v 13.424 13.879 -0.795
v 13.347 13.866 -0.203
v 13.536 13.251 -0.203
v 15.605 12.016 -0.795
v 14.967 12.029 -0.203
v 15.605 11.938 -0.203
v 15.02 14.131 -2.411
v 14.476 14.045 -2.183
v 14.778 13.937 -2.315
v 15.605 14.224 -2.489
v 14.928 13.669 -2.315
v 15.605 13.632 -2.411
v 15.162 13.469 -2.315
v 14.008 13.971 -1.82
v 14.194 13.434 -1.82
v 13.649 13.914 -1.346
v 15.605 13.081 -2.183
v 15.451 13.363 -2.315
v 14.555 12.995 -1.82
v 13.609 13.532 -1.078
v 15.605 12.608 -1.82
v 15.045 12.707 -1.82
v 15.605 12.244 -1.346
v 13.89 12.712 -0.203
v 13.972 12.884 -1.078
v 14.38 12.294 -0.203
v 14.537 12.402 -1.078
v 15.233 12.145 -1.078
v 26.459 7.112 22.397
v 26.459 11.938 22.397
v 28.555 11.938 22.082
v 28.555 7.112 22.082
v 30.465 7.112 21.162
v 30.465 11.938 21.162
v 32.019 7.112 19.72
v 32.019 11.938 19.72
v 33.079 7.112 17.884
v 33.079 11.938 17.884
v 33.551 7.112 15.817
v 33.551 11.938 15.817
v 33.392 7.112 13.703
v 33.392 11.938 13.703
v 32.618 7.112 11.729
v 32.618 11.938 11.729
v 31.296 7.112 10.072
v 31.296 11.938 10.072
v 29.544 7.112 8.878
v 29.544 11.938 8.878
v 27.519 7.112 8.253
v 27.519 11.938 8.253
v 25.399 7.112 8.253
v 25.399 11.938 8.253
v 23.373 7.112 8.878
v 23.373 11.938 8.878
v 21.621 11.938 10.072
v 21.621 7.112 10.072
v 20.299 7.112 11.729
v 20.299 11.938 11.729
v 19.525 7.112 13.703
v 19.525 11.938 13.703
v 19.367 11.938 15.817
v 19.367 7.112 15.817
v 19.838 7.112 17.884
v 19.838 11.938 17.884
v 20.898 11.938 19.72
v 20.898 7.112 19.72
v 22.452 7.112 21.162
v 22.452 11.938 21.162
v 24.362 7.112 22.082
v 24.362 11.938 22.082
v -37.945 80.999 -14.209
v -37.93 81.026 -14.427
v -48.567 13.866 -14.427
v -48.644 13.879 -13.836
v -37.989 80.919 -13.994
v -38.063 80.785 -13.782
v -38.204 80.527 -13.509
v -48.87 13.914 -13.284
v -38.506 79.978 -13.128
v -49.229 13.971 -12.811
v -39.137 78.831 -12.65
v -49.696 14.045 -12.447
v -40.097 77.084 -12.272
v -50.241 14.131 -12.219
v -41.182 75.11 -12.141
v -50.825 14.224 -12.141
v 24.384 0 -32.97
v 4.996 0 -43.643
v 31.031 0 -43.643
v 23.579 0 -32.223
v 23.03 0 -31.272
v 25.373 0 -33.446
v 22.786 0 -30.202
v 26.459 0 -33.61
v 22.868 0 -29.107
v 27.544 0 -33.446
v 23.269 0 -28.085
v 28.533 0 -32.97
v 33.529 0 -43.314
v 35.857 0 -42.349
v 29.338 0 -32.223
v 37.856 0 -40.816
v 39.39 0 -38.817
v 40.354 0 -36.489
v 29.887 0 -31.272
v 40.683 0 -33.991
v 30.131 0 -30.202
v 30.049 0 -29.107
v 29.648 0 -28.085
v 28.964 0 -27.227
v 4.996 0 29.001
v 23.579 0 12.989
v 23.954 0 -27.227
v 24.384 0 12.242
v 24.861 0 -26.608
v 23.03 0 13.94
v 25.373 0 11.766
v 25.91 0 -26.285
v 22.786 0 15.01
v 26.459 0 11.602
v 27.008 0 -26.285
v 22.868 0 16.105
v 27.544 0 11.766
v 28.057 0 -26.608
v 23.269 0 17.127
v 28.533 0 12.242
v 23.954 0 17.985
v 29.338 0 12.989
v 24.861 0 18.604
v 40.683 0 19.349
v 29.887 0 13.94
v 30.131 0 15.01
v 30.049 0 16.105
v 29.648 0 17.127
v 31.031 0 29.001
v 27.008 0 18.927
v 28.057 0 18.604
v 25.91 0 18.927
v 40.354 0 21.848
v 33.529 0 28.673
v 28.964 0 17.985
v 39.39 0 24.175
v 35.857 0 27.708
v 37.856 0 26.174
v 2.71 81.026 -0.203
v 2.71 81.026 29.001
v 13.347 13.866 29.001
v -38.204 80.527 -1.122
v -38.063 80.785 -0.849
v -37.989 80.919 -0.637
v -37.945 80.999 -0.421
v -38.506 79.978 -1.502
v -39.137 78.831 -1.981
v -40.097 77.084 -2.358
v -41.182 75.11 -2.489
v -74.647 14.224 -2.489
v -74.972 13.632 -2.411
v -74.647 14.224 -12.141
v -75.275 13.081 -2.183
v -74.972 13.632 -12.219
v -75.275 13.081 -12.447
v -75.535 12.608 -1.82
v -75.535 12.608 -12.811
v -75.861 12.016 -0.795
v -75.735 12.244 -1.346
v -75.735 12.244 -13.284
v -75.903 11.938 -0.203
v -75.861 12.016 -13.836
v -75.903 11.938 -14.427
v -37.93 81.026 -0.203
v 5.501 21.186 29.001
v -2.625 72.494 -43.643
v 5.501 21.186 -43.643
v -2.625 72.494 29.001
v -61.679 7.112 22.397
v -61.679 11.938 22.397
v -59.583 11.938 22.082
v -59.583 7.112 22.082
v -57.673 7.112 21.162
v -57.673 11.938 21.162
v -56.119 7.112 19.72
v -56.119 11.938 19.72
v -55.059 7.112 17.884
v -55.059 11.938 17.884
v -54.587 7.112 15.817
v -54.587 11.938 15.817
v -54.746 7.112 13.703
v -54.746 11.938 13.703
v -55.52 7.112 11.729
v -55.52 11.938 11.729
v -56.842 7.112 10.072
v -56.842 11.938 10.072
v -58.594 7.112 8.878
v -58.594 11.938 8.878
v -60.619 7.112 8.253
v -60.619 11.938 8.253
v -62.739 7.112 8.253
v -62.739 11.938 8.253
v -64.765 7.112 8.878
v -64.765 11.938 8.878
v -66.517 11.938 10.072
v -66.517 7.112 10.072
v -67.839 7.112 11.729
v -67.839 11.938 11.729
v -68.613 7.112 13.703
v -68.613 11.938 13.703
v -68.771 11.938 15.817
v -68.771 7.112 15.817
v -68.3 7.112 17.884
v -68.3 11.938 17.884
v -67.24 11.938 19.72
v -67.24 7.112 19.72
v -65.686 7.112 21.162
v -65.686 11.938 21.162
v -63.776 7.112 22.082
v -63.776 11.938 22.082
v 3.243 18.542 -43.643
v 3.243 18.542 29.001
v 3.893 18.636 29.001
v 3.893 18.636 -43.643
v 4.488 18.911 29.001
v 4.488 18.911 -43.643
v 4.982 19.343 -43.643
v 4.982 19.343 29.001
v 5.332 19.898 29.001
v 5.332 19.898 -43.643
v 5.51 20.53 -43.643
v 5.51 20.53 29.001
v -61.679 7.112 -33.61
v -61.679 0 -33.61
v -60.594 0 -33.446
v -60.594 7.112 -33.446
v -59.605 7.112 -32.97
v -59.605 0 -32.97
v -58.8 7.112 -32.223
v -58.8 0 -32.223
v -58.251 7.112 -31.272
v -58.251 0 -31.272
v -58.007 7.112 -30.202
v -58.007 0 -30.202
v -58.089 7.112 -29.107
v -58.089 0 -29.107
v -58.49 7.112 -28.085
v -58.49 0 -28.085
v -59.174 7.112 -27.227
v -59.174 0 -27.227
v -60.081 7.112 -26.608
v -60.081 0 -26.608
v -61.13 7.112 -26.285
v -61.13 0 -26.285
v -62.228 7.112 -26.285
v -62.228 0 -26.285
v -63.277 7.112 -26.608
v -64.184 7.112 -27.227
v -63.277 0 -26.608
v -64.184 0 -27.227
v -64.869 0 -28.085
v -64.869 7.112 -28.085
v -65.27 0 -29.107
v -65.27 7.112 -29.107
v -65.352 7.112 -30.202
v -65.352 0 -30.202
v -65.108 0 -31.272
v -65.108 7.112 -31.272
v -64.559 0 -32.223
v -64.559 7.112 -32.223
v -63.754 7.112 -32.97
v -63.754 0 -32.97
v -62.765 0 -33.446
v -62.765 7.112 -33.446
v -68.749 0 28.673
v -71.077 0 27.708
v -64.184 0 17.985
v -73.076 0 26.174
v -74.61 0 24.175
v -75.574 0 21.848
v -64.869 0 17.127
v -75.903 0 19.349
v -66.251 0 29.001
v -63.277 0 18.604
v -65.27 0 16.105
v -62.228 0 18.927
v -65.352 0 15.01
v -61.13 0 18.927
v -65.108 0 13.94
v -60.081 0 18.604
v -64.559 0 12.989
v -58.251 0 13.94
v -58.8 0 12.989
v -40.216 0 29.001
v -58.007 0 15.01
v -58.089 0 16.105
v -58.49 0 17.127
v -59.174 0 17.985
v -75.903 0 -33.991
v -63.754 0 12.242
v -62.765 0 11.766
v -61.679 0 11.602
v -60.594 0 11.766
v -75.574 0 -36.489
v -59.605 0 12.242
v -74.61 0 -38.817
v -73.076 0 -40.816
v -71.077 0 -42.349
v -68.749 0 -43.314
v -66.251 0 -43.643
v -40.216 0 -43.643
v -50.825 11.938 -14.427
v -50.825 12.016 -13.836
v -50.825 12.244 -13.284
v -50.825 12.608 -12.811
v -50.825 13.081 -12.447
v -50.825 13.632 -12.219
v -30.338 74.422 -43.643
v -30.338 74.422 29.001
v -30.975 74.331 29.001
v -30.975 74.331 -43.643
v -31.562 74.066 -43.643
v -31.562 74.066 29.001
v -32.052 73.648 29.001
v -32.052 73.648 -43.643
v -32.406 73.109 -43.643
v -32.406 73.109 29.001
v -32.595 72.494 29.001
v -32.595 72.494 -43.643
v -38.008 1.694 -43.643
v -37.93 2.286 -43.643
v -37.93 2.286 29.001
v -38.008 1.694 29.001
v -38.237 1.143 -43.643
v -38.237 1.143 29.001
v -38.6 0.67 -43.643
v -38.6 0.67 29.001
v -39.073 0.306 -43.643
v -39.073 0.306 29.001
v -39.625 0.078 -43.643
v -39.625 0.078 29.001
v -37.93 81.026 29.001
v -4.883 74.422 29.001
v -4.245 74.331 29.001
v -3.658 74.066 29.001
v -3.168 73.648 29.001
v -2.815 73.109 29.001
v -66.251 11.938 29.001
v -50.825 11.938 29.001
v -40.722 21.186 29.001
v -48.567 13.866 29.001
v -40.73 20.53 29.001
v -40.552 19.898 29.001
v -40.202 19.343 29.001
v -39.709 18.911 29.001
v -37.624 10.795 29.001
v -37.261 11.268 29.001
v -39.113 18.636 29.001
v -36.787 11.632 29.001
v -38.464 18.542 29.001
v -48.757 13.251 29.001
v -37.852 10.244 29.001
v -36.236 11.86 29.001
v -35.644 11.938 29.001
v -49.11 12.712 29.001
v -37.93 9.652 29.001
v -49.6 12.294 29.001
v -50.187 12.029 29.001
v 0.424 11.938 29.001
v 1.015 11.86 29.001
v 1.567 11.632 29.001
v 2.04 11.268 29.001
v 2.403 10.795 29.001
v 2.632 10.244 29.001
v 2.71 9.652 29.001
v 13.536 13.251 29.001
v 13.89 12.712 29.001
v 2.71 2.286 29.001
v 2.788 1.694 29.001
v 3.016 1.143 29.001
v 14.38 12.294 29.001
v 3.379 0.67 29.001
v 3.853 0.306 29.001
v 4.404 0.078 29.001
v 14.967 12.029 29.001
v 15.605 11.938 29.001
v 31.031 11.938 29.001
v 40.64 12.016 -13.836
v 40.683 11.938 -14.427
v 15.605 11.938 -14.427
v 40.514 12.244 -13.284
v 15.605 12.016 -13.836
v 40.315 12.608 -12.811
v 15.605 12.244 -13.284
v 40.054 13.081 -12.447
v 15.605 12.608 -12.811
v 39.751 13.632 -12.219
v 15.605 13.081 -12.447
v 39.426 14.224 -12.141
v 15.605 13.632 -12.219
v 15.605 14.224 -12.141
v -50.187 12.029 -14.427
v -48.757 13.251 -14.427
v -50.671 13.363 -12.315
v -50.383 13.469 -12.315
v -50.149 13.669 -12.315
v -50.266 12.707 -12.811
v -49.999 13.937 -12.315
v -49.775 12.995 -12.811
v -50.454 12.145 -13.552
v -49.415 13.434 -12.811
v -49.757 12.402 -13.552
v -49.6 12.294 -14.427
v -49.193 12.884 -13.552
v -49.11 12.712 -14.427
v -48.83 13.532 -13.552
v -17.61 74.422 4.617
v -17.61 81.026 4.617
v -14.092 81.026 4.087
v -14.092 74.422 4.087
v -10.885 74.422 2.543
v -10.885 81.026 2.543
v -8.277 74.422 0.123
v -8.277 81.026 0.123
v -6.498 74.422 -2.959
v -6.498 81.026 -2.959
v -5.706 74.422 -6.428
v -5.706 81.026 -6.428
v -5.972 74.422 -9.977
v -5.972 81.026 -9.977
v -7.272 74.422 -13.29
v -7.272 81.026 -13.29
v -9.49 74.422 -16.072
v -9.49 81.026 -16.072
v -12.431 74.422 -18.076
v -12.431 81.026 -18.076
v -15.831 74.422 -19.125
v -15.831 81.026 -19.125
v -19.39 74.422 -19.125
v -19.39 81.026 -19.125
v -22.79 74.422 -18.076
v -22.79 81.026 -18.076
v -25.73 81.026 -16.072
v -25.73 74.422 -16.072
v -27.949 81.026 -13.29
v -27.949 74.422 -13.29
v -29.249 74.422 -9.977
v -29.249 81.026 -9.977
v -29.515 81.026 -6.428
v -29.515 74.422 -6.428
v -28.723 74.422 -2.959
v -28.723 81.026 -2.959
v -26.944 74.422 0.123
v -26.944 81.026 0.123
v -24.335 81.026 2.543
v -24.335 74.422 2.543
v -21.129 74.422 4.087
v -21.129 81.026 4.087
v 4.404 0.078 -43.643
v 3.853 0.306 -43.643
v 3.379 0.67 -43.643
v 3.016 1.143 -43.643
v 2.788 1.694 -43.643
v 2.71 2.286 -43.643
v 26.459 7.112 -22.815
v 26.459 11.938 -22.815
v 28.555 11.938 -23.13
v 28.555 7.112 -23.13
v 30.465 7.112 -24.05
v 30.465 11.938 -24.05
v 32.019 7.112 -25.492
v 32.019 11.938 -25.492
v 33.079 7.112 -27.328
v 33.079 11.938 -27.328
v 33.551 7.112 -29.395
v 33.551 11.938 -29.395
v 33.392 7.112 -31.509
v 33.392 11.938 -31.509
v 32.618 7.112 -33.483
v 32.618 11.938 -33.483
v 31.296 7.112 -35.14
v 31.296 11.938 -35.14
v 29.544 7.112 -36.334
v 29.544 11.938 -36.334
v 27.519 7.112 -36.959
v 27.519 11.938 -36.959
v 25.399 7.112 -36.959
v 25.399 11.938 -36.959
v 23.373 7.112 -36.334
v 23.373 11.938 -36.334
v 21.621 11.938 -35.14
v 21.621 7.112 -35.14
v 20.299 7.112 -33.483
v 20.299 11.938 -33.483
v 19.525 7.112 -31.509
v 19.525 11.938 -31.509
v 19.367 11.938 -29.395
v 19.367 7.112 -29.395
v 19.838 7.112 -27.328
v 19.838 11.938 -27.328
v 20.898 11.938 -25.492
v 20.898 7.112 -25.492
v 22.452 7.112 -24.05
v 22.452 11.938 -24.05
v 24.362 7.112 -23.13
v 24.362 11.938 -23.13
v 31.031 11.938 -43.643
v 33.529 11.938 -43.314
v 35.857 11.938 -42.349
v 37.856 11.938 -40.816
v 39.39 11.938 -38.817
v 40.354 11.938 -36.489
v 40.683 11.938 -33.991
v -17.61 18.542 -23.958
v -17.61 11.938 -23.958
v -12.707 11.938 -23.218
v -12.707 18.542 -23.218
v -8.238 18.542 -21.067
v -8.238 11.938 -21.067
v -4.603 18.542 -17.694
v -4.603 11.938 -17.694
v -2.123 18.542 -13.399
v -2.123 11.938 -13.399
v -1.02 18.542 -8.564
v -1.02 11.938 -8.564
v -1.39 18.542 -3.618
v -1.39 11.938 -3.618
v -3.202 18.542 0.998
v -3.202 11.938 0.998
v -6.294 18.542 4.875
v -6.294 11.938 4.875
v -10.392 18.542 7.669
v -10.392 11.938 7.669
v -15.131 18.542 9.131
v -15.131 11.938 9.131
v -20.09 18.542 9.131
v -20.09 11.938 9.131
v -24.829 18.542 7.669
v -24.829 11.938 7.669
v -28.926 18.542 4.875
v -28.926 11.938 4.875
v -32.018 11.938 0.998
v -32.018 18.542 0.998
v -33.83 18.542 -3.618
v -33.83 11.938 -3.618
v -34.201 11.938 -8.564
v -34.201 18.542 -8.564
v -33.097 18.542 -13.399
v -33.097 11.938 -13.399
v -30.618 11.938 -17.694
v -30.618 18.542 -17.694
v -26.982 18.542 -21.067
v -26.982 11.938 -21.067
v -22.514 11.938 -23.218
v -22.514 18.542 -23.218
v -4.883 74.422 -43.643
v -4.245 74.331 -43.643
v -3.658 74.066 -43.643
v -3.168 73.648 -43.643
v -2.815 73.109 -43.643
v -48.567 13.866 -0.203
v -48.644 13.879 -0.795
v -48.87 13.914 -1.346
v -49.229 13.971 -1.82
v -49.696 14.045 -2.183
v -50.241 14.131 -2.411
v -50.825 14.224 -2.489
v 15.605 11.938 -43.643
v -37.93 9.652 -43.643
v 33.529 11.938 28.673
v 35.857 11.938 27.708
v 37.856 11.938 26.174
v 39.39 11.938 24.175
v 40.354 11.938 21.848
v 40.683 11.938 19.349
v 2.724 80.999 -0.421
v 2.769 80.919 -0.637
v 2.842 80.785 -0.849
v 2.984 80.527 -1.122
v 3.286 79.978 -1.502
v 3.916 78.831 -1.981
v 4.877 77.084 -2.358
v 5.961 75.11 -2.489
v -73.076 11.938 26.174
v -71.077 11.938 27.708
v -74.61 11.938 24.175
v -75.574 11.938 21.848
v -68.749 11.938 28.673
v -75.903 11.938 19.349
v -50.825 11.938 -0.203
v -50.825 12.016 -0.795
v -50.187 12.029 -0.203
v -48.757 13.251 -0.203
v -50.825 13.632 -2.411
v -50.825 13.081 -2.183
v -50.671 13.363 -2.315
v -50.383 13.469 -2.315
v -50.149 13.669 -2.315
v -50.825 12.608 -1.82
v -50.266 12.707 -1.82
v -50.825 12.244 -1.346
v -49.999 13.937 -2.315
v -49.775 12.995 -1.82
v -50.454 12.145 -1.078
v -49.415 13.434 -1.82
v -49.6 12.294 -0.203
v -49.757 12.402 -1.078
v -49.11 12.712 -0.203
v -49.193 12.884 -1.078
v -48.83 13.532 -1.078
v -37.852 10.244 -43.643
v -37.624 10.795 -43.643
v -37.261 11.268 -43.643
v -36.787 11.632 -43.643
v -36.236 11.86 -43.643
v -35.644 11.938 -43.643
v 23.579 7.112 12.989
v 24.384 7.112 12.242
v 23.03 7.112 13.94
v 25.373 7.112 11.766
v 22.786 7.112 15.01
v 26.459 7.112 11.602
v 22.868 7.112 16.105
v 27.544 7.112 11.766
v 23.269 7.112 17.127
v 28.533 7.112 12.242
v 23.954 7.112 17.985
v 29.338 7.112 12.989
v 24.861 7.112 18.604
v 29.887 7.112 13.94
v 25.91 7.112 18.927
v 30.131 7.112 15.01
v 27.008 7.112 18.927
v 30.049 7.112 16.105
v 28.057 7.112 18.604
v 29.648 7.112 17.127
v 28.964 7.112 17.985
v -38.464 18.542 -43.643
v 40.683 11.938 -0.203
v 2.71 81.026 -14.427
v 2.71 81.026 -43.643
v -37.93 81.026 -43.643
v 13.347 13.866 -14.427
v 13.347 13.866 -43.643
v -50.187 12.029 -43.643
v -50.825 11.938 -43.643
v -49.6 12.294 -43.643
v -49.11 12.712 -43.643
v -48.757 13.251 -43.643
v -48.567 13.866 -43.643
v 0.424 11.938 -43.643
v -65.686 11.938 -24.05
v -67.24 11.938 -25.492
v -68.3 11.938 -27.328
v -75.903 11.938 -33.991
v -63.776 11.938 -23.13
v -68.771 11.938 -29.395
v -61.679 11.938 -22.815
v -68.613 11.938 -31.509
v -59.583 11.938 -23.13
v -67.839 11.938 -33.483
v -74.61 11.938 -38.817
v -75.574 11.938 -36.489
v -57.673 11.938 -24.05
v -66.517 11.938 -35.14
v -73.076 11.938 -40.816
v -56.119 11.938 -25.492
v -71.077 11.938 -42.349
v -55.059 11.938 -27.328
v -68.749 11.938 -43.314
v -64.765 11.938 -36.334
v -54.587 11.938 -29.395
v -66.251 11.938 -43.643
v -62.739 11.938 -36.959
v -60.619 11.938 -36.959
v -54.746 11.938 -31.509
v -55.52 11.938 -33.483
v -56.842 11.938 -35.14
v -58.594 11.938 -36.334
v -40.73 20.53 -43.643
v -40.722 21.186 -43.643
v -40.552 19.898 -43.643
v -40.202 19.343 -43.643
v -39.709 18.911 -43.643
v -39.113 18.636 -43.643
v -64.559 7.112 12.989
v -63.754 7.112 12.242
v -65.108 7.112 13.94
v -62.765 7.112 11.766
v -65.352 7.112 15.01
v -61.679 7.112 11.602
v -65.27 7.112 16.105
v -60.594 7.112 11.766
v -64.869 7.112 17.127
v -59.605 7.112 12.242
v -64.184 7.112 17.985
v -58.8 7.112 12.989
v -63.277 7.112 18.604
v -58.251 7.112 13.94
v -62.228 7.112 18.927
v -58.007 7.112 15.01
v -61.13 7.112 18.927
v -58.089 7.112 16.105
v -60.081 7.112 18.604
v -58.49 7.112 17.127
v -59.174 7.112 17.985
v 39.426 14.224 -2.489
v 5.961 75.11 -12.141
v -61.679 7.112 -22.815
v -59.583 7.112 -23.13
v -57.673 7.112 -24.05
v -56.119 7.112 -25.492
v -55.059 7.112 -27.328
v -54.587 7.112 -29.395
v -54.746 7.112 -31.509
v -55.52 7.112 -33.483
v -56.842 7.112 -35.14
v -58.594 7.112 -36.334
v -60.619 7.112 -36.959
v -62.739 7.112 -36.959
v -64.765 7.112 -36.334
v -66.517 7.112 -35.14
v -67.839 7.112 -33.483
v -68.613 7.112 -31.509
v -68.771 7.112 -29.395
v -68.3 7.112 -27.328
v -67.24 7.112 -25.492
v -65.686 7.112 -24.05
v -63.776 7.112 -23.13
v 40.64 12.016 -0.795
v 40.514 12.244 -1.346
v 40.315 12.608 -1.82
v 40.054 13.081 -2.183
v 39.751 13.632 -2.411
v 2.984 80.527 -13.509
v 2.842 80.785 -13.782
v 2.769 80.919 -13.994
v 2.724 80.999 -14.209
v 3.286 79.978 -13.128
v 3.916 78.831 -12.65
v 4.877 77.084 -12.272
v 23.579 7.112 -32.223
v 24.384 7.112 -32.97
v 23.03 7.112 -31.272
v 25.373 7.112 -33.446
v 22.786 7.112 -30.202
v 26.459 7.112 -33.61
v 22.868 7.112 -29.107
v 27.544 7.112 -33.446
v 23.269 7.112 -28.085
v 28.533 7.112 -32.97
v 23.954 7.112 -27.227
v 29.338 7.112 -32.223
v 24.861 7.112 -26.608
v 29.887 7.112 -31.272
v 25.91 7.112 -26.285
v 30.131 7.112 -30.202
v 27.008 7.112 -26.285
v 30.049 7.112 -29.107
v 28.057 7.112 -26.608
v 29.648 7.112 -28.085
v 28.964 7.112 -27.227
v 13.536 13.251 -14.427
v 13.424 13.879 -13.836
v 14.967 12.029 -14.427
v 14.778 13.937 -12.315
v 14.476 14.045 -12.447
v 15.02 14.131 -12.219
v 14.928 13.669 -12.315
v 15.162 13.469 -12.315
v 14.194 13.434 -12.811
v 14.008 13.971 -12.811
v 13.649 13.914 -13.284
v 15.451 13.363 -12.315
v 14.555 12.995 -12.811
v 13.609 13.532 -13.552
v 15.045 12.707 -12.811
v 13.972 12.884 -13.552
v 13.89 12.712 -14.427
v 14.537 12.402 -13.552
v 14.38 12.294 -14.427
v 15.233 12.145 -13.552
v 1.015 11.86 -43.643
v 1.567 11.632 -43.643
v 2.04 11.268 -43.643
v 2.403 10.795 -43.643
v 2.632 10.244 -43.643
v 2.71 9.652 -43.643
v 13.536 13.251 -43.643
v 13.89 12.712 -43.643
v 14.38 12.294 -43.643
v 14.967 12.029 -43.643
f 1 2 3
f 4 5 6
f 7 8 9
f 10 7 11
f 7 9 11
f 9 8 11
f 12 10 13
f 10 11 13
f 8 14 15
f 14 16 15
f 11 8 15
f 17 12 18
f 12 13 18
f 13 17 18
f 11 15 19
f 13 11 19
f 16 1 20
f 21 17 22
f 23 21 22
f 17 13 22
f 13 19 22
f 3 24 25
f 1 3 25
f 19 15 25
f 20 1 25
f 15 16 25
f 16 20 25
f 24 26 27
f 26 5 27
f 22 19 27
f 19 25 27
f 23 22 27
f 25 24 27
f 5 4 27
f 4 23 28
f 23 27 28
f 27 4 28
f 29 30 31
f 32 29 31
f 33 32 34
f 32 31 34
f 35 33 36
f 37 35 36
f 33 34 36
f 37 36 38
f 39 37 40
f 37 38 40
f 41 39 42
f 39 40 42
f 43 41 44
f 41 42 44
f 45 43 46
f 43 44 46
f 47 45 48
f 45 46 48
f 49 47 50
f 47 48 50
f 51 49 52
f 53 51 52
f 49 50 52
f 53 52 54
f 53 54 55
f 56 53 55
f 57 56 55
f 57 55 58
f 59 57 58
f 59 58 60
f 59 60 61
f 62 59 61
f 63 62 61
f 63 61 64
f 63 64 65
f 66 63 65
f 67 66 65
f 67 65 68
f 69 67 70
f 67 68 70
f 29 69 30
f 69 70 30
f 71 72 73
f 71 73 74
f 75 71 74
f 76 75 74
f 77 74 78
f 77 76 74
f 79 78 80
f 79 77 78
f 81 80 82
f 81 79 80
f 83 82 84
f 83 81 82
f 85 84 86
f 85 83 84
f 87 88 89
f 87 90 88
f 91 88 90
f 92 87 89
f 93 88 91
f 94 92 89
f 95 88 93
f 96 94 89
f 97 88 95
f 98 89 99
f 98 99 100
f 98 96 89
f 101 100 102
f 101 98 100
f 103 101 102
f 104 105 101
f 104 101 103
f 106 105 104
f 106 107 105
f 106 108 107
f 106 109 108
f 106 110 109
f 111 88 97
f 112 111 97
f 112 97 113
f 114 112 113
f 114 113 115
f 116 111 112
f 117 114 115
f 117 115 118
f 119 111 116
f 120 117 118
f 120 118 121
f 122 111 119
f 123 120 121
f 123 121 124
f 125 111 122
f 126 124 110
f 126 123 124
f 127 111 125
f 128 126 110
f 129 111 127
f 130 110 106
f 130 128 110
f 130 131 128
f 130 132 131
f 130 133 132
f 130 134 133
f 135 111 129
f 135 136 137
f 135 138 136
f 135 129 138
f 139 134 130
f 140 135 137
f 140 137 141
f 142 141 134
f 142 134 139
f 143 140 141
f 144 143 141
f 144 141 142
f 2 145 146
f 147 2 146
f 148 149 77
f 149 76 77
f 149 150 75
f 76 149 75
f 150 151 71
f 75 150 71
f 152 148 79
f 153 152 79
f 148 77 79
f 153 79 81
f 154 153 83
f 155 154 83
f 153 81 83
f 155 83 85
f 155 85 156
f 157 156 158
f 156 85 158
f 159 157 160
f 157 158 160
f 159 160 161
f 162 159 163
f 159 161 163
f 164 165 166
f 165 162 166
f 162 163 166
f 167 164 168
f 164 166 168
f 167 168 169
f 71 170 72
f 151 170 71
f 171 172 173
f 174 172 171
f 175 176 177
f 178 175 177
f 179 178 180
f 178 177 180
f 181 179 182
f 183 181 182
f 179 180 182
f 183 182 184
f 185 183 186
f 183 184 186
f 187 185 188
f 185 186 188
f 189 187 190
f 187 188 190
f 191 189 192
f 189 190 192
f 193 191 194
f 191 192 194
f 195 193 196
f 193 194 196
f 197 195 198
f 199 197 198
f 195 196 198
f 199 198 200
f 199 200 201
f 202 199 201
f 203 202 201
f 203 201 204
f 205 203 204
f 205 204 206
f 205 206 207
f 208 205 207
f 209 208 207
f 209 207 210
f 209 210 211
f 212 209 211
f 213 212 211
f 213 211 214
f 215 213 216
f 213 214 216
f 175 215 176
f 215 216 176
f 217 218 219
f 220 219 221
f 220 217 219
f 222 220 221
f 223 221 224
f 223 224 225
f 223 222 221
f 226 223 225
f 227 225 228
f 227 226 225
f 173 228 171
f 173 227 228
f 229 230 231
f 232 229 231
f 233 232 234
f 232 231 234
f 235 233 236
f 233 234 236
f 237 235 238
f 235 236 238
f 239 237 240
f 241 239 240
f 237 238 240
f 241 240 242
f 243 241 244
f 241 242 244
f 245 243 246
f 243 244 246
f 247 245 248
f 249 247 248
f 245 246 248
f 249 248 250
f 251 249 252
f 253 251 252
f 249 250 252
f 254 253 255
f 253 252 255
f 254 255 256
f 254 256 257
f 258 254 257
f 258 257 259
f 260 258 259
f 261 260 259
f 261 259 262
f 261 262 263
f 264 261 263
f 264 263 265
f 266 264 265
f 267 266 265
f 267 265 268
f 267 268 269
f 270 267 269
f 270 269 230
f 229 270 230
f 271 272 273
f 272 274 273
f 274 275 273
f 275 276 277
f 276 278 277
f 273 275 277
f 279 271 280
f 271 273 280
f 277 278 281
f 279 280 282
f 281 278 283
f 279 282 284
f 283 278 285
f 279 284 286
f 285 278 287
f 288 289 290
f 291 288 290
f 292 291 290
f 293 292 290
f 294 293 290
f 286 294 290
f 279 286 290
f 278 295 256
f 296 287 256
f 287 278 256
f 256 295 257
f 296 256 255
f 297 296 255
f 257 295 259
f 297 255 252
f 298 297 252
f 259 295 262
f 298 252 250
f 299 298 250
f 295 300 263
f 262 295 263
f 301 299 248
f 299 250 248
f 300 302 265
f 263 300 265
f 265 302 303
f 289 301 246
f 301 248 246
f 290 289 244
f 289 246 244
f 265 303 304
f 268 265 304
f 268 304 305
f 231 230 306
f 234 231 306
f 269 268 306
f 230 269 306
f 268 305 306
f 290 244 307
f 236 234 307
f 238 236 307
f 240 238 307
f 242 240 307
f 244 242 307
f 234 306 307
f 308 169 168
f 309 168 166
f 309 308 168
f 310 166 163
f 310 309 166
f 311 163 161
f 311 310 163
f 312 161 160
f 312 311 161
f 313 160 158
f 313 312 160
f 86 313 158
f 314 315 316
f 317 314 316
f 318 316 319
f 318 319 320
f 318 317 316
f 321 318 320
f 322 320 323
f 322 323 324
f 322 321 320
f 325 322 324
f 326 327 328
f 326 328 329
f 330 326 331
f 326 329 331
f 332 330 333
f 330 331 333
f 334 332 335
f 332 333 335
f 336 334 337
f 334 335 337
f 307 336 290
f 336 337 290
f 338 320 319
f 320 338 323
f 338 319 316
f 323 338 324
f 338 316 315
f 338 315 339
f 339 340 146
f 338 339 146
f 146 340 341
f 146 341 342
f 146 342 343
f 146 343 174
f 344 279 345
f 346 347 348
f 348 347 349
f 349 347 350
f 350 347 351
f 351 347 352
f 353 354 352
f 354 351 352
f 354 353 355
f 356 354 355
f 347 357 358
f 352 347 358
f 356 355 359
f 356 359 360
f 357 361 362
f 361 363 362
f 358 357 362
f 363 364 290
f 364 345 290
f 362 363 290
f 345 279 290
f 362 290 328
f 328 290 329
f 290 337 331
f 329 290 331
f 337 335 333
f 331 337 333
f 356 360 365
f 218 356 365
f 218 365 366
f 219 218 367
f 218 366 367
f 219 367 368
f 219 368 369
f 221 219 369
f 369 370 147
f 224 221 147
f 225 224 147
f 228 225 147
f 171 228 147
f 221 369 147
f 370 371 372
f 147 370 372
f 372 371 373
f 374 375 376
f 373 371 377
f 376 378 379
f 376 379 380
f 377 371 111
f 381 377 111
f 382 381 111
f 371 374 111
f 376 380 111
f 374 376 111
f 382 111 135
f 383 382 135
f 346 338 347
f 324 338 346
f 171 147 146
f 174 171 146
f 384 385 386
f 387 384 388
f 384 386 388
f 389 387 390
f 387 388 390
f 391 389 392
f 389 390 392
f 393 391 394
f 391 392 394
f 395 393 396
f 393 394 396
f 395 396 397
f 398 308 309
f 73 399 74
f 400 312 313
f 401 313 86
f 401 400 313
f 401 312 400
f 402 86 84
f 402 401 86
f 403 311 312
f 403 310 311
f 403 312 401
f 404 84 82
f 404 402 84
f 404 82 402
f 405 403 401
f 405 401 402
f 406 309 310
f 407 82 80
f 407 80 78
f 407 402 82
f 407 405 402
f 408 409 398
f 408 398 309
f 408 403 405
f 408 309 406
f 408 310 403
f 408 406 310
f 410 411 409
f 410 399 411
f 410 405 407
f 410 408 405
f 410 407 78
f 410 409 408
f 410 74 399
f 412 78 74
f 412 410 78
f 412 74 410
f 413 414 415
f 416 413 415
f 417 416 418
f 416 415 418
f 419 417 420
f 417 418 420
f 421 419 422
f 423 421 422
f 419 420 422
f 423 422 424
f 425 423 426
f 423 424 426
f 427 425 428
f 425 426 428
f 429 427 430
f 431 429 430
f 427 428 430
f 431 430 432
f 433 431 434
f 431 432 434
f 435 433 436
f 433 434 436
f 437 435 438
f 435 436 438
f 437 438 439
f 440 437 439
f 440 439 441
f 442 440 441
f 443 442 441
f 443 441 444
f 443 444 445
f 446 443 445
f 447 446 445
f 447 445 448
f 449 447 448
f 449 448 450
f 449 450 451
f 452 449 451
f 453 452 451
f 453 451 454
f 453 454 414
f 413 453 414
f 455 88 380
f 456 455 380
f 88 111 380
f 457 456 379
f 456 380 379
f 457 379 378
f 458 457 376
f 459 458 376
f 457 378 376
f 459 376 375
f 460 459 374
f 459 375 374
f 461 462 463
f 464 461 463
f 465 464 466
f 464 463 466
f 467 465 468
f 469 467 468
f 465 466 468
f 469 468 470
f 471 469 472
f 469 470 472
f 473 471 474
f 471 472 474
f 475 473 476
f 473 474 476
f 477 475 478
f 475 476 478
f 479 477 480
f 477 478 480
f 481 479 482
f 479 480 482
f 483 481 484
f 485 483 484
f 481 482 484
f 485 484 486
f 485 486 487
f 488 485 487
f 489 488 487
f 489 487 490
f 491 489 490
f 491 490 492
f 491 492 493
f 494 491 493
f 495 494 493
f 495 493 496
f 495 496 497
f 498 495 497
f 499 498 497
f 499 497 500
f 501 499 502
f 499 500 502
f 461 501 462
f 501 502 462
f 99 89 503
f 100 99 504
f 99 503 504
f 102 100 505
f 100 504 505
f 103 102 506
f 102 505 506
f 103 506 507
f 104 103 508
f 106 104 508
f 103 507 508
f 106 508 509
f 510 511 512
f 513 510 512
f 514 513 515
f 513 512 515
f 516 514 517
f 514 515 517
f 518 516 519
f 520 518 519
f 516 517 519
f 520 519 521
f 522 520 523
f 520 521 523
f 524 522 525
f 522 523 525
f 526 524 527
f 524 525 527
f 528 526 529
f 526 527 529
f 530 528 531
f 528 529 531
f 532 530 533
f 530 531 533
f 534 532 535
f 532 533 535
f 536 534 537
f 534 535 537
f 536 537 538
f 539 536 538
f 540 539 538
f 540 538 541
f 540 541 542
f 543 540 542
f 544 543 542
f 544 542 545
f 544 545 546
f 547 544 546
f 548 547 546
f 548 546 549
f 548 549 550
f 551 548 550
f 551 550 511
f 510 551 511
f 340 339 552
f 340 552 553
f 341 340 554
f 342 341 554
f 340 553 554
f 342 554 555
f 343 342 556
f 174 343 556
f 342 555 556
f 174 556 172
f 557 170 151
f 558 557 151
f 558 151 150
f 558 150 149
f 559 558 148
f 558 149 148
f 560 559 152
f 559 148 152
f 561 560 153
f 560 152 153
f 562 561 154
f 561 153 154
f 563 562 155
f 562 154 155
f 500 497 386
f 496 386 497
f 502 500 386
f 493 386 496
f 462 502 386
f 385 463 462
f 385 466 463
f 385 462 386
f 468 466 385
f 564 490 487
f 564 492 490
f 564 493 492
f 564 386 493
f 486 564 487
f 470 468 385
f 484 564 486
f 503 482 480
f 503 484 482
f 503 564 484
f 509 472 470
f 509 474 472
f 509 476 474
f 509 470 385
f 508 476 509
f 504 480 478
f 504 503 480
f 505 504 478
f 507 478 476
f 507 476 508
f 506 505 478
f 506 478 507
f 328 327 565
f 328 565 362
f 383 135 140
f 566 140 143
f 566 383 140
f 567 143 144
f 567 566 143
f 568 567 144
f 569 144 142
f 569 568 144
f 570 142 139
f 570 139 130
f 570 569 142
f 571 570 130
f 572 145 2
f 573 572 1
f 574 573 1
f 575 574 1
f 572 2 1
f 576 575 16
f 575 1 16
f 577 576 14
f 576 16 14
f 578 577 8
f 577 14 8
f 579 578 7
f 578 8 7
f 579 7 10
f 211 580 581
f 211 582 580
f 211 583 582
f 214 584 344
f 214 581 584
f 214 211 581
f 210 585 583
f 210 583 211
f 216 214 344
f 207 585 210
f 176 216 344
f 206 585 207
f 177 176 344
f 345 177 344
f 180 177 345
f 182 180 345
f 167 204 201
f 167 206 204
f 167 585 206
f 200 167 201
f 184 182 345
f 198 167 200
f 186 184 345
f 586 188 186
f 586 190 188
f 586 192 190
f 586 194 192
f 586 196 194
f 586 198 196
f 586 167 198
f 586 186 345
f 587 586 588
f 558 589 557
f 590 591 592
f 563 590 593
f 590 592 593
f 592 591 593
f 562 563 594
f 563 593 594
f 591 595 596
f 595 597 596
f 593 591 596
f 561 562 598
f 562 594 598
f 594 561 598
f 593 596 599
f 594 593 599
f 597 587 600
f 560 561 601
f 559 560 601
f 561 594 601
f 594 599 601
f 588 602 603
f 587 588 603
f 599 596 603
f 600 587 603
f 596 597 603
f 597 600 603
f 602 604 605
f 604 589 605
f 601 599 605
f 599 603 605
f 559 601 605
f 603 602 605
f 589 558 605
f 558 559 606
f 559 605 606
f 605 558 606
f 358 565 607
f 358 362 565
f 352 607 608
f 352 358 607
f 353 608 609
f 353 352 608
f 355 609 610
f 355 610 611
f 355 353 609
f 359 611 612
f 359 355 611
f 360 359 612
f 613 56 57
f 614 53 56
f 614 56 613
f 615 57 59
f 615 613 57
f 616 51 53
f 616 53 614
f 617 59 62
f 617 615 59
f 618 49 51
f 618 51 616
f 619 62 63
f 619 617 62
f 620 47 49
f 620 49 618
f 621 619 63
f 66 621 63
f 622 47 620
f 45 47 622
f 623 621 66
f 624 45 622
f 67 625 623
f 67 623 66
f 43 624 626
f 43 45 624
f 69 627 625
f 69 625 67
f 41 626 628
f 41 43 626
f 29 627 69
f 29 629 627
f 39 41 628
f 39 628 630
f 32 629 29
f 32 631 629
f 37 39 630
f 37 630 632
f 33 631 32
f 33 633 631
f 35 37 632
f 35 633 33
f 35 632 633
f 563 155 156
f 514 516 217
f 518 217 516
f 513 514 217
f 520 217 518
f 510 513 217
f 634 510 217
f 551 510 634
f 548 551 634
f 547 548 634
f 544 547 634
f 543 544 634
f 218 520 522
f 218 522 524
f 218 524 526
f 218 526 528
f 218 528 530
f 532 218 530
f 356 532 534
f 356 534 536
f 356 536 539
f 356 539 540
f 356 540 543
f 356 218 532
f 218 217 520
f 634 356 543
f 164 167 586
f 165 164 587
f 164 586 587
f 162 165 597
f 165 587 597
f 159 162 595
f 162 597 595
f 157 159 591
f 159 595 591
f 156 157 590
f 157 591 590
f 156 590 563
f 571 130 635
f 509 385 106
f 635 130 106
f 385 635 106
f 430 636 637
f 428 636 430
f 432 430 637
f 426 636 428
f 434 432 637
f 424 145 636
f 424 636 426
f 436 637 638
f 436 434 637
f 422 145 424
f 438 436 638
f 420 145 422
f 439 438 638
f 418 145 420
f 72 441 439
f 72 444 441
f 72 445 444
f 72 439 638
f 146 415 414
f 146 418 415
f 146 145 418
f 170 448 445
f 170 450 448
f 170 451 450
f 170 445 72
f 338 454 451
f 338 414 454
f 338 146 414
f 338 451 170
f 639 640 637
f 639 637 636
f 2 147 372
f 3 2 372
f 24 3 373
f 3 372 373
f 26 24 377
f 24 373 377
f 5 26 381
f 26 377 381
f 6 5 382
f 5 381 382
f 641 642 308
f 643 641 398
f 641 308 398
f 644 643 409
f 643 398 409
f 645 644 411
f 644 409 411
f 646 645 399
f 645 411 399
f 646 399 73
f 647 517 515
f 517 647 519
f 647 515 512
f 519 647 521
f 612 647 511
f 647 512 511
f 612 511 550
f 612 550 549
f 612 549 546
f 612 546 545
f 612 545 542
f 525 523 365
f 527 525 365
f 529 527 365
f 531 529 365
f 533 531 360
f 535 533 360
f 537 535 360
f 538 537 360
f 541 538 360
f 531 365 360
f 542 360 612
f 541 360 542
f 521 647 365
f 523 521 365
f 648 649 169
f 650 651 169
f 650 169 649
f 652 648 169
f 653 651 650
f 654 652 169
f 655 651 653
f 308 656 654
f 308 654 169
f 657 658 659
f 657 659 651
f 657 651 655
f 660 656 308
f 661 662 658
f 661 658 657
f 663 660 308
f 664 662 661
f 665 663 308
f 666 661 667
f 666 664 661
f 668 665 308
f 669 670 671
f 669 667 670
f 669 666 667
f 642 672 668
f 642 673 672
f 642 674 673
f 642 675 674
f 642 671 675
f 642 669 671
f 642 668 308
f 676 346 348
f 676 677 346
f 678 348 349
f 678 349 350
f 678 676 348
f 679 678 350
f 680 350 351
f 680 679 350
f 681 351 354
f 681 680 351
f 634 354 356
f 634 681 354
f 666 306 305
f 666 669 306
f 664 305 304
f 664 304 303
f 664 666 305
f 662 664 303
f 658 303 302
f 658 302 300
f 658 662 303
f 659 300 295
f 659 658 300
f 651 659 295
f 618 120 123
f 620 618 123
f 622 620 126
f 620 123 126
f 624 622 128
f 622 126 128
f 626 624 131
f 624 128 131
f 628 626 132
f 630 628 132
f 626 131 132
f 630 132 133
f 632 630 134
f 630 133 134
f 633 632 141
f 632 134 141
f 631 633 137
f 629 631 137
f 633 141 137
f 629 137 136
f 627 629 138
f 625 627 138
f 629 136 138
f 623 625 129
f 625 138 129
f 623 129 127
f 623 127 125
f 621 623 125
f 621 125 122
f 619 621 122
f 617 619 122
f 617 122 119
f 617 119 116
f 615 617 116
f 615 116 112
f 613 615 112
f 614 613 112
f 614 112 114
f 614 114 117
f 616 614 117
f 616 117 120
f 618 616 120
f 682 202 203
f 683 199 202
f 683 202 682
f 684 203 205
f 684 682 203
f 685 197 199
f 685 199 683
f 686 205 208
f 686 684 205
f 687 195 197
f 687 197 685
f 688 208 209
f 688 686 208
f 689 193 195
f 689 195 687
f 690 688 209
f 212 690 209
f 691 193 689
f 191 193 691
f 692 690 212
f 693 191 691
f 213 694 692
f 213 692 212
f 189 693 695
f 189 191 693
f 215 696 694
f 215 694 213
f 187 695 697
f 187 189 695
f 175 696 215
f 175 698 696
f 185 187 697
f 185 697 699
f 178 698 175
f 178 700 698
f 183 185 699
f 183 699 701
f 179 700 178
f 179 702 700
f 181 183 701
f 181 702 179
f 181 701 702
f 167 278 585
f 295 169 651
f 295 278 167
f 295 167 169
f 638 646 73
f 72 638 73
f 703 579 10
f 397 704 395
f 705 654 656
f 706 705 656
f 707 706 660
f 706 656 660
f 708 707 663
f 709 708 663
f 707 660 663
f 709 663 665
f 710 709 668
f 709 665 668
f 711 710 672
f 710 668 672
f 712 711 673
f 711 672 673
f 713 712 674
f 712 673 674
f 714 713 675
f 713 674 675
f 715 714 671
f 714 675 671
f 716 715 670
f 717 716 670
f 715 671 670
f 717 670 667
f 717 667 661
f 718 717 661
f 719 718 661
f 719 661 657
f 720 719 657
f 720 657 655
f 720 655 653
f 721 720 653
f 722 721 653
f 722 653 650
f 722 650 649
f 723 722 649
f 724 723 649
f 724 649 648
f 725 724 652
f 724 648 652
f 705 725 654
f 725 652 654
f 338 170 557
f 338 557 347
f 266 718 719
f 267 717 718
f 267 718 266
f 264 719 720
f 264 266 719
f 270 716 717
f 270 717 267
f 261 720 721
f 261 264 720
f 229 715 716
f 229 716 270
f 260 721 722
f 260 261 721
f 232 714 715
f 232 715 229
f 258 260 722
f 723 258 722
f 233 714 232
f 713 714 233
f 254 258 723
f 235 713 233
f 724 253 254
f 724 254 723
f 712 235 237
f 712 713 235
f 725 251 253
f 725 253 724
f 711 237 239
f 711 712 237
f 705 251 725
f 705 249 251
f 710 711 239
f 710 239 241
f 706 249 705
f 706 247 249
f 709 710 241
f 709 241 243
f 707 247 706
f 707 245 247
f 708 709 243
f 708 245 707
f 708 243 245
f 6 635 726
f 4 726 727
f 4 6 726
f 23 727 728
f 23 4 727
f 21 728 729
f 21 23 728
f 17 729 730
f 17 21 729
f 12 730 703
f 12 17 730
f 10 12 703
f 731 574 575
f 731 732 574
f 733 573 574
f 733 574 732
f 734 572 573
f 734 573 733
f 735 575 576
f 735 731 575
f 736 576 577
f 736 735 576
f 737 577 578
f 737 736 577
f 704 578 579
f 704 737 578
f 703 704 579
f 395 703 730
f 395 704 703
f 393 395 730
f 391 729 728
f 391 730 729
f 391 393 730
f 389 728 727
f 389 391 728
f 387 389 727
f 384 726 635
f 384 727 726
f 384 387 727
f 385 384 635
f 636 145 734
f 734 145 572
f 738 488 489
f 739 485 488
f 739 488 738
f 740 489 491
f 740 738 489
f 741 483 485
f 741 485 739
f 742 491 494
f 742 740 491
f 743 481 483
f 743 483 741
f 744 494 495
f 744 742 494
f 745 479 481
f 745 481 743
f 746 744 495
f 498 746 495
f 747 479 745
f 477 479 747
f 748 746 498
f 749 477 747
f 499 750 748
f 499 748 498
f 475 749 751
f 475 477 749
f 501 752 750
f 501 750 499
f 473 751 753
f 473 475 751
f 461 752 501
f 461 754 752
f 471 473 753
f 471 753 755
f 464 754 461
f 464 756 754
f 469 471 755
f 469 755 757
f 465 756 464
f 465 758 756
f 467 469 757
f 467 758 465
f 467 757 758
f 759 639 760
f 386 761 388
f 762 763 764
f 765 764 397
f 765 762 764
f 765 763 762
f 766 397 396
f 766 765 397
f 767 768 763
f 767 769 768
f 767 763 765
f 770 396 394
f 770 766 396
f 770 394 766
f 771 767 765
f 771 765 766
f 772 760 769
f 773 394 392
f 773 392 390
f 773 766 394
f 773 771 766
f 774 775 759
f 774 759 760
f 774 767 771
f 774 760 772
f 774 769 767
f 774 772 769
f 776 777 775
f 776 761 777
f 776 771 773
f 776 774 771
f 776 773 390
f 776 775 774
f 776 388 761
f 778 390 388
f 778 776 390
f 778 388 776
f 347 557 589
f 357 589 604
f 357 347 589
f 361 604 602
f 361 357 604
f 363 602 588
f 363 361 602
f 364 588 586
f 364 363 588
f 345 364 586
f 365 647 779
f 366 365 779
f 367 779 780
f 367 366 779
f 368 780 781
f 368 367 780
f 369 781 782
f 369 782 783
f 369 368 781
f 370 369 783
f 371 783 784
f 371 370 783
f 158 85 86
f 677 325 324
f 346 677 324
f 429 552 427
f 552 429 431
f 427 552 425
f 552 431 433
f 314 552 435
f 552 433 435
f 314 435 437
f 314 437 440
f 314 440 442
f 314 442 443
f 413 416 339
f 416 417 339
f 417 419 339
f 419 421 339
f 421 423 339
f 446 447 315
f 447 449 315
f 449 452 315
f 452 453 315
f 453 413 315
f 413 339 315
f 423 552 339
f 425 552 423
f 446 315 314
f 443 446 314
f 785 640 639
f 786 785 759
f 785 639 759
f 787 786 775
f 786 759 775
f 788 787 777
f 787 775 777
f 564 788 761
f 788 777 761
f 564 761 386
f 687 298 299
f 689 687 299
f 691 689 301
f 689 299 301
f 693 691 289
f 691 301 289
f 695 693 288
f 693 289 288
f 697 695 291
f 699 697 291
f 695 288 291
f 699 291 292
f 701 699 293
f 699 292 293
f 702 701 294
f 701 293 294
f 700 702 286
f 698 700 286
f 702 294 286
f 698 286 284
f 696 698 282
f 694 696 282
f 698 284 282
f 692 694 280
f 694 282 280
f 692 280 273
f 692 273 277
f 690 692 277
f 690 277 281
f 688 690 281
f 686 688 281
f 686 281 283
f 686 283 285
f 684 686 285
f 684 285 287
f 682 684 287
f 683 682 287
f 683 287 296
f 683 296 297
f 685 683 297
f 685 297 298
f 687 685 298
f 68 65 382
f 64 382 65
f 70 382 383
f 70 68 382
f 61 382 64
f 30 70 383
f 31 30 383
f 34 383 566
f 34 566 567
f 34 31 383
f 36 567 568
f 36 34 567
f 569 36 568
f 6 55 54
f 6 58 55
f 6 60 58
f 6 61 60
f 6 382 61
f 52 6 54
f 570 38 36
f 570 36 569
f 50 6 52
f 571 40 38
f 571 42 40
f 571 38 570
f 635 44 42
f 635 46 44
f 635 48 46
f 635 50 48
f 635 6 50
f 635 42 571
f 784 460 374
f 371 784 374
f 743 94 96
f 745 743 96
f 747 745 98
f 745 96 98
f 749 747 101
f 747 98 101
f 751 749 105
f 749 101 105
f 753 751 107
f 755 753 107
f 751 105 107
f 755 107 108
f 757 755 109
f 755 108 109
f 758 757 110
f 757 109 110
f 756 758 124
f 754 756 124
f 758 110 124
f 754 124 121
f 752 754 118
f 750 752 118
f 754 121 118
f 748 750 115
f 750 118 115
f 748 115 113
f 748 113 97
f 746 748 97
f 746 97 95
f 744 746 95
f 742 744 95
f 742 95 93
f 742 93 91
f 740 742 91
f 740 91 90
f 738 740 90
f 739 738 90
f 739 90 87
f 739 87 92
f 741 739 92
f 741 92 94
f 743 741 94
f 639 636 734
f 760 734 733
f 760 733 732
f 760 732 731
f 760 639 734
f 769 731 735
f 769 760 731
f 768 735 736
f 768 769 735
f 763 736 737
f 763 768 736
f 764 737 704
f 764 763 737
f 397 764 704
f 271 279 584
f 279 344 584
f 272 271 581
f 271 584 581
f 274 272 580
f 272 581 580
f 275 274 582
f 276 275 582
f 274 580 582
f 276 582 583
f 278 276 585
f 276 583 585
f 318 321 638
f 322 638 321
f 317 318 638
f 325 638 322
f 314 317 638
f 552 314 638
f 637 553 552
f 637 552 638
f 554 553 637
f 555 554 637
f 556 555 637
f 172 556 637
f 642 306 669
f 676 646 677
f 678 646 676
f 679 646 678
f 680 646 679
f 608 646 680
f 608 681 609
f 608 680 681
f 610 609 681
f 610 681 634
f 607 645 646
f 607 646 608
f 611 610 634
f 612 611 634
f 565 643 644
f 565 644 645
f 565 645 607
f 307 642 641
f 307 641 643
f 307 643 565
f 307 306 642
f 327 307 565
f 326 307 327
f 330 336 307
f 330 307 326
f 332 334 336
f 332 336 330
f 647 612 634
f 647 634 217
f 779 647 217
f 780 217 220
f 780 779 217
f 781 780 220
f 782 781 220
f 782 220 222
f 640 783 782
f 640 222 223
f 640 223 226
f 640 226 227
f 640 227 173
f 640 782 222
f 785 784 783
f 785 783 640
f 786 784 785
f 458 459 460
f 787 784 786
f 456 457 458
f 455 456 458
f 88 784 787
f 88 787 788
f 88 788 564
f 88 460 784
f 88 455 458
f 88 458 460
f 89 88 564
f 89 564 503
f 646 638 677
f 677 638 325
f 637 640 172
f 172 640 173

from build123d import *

# Parameters (mm, degrees)
SKETCH1_W            = 116.586
SKETCH1_H            = 72.644
EXTRUDE1_DEPTH       = 11.938
SKETCH2_R            = 9.517718459
CUT_EXTRUDE1_DEPTH   = 89.365734061
SKETCH5_W            = 40.64
SKETCH5_H            = 72.644
EXTRUDE3_DEPTH       = 69.088
EXTRUDE3_DRAFT       = 9
SKETCH6_W            = 40.64
SKETCH6_H            = 72.644
CUT_EXTRUDE3_DEPTH   = 11.938
SKETCH7_W            = 69.622985634
SKETCH7_H            = 14.548045231
CUT_EXTRUDE4_DEPTH   = 117.249686156
SKETCH8_W            = 84.138542923
SKETCH8_H            = 16.028207861
CUT_EXTRUDE5_DEPTH   = 117.249686156
SHELL1_T             = -6.604
CUT_EXTRUDE6_REACH   = 113.531
SKETCH9_R            = 16.637
CUT_EXTRUDE7_REACH   = 121.295
SKETCH10_R           = 11.938
SKETCH14_R           = 9.517718459
EXTRUDE5_DEPTH       = 11.938
SKETCH15_R           = 3.683
CUT_EXTRUDE10_DEPTH  = 120.294592451
SKETCH16_R           = 7.112
CUT_EXTRUDE11_DEPTH  = 4.826
LPATTERN2_COUNT      = 2
LPATTERN2_PITCH      = 45.212
LPATTERN2_COUNT_DIR2 = 2
LPATTERN2_PITCH_DIR2 = 88.138
FILLET1_R            = 9.652
FILLET2_R            = 2.286
FILLET3_R            = 2.286
RIB1_REACH           = 118.817
SKETCH21_WALL_W      = 314.469849536
SKETCH21_WALL_H      = 9.652
RIB2_REACH           = 118.817
SKETCH22_WALL_W      = 314.469849536
SKETCH22_WALL_H      = 9.652
FILLET4_R            = 2.286
FILLET5_R            = 2.286


with BuildPart() as part:
    # Sketch1 → Extrude1 (new body)
    with BuildSketch(Plane(origin=(0, 0, 0), x_dir=(1, 0, 0), z_dir=(0, 1, 0))):
        with Locations((-17.610350746, 7.320507463)):
            Rectangle(SKETCH1_W, SKETCH1_H)
    extrude(amount=EXTRUDE1_DEPTH)

    # Sketch2 → Cut-Extrude1 (cut, through all)
    with BuildSketch(Plane(origin=(0, 11.938, 0), x_dir=(-1, 0, 0), z_dir=(0, 1, 0))):
        with Locations(Location((-26.458649254, 15.285492537, 0), (0, 0, 90))):
            Circle(SKETCH2_R)
    extrude(amount=-CUT_EXTRUDE1_DEPTH, mode=Mode.SUBTRACT)


with BuildPart() as extrude3_tool:
    # Sketch5 → Extrude3 (with draft: the straight prism first)
    with BuildSketch(Plane(origin=(0, 81.026, 0), x_dir=(-1, 0, 0), z_dir=(0, 1, 0))):
        with Locations((17.610350746, -7.320507463)):
            Rectangle(SKETCH5_W, SKETCH5_H)
    extrude(amount=-EXTRUDE3_DEPTH)
    # Extrude3: the draft: its side faces are tilted about the plane it starts from
    extrude3_sides = [extrude3_tool.faces().sort_by_distance(p)[0] for p in [
        (-37.930350746, 46.482, -7.320507463),
        (-17.610350746, 46.482, 29.001492537),
        (2.709649254, 46.482, -7.320507463),
        (-17.610350746, 46.482, -43.642507463),
    ]]
    draft(extrude3_sides, Plane(origin=(0, 81.026, 0), x_dir=(-1, 0, 0), z_dir=(0, 1, 0)), EXTRUDE3_DRAFT)


with BuildPart() as part_1:
    add(part.part)

    # Extrude3: add extrude3_tool
    add(extrude3_tool.part)

    # Sketch6 → Cut-Extrude3 (cut)
    with BuildSketch(Plane.XZ):
        with Locations((-17.610350746, -7.320507463)):
            Rectangle(SKETCH6_W, SKETCH6_H)
    extrude(amount=-CUT_EXTRUDE3_DEPTH, mode=Mode.SUBTRACT)

    # Sketch7 → Cut-Extrude4 (cut, through all)
    with BuildSketch(Plane.XZ.offset(-11.938)):
        with Locations((-17.718126266, 36.275515152)):
            Rectangle(SKETCH7_W, SKETCH7_H)
    extrude(amount=-CUT_EXTRUDE4_DEPTH, mode=Mode.SUBTRACT)

    # Sketch8 → Cut-Extrude5 (cut, through all)
    with BuildSketch(Plane.XZ.offset(-11.938)):
        with Locations((-14.253759939, -51.656611394)):
            Rectangle(SKETCH8_W, SKETCH8_H)
    extrude(amount=-CUT_EXTRUDE5_DEPTH, mode=Mode.SUBTRACT)

    # Shell1
    shell1_openings = [part_1.faces().sort_by_distance(p)[0] for p in [
        (-17.610350746, 36.31822783, -43.642507463),
        (-17.610350746, 36.31822783, 29.001492537),
    ]]
    offset(amount=SHELL1_T, openings=shell1_openings, kind=Kind.INTERSECTION)

    # Sketch9 → Cut-Extrude6 (cut, up to next)
    with BuildSketch(Plane.XZ.offset(-11.938), mode=Mode.PRIVATE) as cut_extrude6_sk1:
        with Locations(Location((-17.610350746, -7.320507463, 0), (0, 0, 270))):
            Circle(SKETCH9_R)
    cut_extrude6_tool1 = extrude(cut_extrude6_sk1.sketch, amount=-CUT_EXTRUDE6_REACH, mode=Mode.PRIVATE) & part_1.part
    add(cut_extrude6_tool1.solids().sort_by_distance((-17.610351, 11.938, -7.320507))[0], mode=Mode.SUBTRACT)

    # Sketch10 → Cut-Extrude7 (cut, up to next)
    with BuildSketch(Plane(origin=(0, 81.026, 0), x_dir=(-1, 0, 0), z_dir=(0, 1, 0)), mode=Mode.PRIVATE) as cut_extrude7_sk1:
        with Locations(Location((17.610350746, -7.320507463, 0), (0, 0, 90))):
            Circle(SKETCH10_R)
    cut_extrude7_tool1 = extrude(cut_extrude7_sk1.sketch, amount=-CUT_EXTRUDE7_REACH, mode=Mode.PRIVATE) & part_1.part
    add(cut_extrude7_tool1.solids().sort_by_distance((-17.610351, 81.026, -7.320507))[0], mode=Mode.SUBTRACT)

    # Sketch14 → Extrude5 (add)
    with BuildSketch(Plane.XZ):
        with Locations((26.458649254, 15.285492537)):
            Circle(SKETCH14_R)
    extrude(amount=-EXTRUDE5_DEPTH)

    # Sketch15 → Cut-Extrude10 (cut, through all)
    with BuildSketch(Plane.XZ):
        with Locations(Location((26.458649254, 15.285492537, 0), (0, 0, 270))):
            Circle(SKETCH15_R)
    cut_extrude10 = extrude(amount=-CUT_EXTRUDE10_DEPTH, mode=Mode.SUBTRACT)

    # Sketch16 → Cut-Extrude11 (cut)
    with BuildSketch(Plane(origin=(0, 11.938, 0), x_dir=(-1, 0, 0), z_dir=(0, 1, 0))):
        with Locations(Location((-26.458649254, 15.285492537, 0), (0, 0, 90))):
            Circle(SKETCH16_R)
    cut_extrude11 = extrude(amount=-CUT_EXTRUDE11_DEPTH, mode=Mode.SUBTRACT)

    # LPattern2: Cut-Extrude10, Cut-Extrude11 2 × 2
    with Locations(*[(-j * LPATTERN2_PITCH_DIR2, 0, -i * LPATTERN2_PITCH) for i in range(LPATTERN2_COUNT) for j in range(LPATTERN2_COUNT_DIR2) if (i, j) != (0, 0)]):
        add(cut_extrude10, mode=Mode.SUBTRACT)
        add(cut_extrude11, mode=Mode.SUBTRACT)

    # Fillet1
    fillet1_edges = [part_1.edges().sort_by_distance(p)[0] for p in [
        (-75.903350746, 5.969, -43.642507463),
        (40.682649254, 5.969, -43.642507463),
        (40.682649254, 5.969, 29.001492537),
        (-75.903350746, 5.969, 29.001492537),
    ]]
    fillet(fillet1_edges, radius=FILLET1_R)

    # Fillet2
    fillet2_edges = [part_1.edges().sort_by_distance(p)[0] for p in [
        (5.919822932, 18.542, -7.320507463),
        (-41.140524425, 18.542, -7.320507463),
        (-32.290001899, 74.422, -7.320507463),
        (-2.930699593, 74.422, -7.320507463),
    ]]
    fillet(fillet2_edges, radius=FILLET2_R)

    # Fillet3
    fillet3_edges = [part_1.edges().sort_by_distance(p)[0] for p in [
        (-37.930350746, 11.938, -7.320507463),
        (2.709649254, 11.938, -7.320507463),
    ]]
    fillet(fillet3_edges, radius=FILLET3_R)

    # Sketch21 wall → Rib1 (add, up to next)
    with BuildSketch(Plane(origin=(21.696149254, 46.482, -7.3152), x_dir=(0.481671369181, -0.876351922524, 0), z_dir=(0.876351922524, 0.481671369181, 0)), mode=Mode.PRIVATE) as rib1_sk1:
        Rectangle(SKETCH21_WALL_W, SKETCH21_WALL_H)
    rib1_tool1 = extrude(rib1_sk1.sketch, amount=-RIB1_REACH, mode=Mode.PRIVATE) - part_1.part
    add(rib1_tool1.solids().sort_by_distance((21.696149254, 46.482, -7.3152))[0])

    # Sketch22 wall → Rib2 (add, up to next)
    with BuildSketch(Plane(origin=(-56.916850746, 46.482, -7.3152), x_dir=(-0.481671369181, -0.876351922524, 0), z_dir=(0.876351922524, -0.481671369181, 0)), mode=Mode.PRIVATE) as rib2_sk1:
        Rectangle(SKETCH22_WALL_W, SKETCH22_WALL_H)
    rib2_tool1 = extrude(rib2_sk1.sketch, amount=RIB2_REACH, mode=Mode.PRIVATE) - part_1.part
    add(rib2_tool1.solids().sort_by_distance((-56.916850746, 46.482, -7.3152))[0])

    # Fillet4
    fillet4_edges = [part_1.edges().sort_by_distance(p)[0] for p in [
        (13.652113467, 11.938, 13.256146269),
        (-48.872814959, 11.938, -27.891853731),
        (13.652113467, 11.938, -27.891853731),
        (8.18088136, 46.482, -12.1412),
        (27.16738136, 11.938, -12.1412),
        (8.18088136, 46.482, -2.4892),
        (27.16738136, 11.938, -2.4892),
        (-48.872814959, 11.938, 13.256146269),
        (-62.388082853, 11.938, -2.4892),
        (-43.401582853, 46.482, -2.4892),
        (-62.388082853, 11.938, -12.1412),
        (-43.401582853, 46.482, -12.1412),
    ]]
    fillet(fillet4_edges, radius=FILLET4_R)

    # Fillet5
    fillet5_edges = [part_1.edges().sort_by_distance(p)[0] for p in [
        (-37.930350746, 0, -7.320507463),
        (2.709649254, 0, -7.320507463),
    ]]
    fillet(fillet5_edges, radius=FILLET5_R)


solid = part_1.part
